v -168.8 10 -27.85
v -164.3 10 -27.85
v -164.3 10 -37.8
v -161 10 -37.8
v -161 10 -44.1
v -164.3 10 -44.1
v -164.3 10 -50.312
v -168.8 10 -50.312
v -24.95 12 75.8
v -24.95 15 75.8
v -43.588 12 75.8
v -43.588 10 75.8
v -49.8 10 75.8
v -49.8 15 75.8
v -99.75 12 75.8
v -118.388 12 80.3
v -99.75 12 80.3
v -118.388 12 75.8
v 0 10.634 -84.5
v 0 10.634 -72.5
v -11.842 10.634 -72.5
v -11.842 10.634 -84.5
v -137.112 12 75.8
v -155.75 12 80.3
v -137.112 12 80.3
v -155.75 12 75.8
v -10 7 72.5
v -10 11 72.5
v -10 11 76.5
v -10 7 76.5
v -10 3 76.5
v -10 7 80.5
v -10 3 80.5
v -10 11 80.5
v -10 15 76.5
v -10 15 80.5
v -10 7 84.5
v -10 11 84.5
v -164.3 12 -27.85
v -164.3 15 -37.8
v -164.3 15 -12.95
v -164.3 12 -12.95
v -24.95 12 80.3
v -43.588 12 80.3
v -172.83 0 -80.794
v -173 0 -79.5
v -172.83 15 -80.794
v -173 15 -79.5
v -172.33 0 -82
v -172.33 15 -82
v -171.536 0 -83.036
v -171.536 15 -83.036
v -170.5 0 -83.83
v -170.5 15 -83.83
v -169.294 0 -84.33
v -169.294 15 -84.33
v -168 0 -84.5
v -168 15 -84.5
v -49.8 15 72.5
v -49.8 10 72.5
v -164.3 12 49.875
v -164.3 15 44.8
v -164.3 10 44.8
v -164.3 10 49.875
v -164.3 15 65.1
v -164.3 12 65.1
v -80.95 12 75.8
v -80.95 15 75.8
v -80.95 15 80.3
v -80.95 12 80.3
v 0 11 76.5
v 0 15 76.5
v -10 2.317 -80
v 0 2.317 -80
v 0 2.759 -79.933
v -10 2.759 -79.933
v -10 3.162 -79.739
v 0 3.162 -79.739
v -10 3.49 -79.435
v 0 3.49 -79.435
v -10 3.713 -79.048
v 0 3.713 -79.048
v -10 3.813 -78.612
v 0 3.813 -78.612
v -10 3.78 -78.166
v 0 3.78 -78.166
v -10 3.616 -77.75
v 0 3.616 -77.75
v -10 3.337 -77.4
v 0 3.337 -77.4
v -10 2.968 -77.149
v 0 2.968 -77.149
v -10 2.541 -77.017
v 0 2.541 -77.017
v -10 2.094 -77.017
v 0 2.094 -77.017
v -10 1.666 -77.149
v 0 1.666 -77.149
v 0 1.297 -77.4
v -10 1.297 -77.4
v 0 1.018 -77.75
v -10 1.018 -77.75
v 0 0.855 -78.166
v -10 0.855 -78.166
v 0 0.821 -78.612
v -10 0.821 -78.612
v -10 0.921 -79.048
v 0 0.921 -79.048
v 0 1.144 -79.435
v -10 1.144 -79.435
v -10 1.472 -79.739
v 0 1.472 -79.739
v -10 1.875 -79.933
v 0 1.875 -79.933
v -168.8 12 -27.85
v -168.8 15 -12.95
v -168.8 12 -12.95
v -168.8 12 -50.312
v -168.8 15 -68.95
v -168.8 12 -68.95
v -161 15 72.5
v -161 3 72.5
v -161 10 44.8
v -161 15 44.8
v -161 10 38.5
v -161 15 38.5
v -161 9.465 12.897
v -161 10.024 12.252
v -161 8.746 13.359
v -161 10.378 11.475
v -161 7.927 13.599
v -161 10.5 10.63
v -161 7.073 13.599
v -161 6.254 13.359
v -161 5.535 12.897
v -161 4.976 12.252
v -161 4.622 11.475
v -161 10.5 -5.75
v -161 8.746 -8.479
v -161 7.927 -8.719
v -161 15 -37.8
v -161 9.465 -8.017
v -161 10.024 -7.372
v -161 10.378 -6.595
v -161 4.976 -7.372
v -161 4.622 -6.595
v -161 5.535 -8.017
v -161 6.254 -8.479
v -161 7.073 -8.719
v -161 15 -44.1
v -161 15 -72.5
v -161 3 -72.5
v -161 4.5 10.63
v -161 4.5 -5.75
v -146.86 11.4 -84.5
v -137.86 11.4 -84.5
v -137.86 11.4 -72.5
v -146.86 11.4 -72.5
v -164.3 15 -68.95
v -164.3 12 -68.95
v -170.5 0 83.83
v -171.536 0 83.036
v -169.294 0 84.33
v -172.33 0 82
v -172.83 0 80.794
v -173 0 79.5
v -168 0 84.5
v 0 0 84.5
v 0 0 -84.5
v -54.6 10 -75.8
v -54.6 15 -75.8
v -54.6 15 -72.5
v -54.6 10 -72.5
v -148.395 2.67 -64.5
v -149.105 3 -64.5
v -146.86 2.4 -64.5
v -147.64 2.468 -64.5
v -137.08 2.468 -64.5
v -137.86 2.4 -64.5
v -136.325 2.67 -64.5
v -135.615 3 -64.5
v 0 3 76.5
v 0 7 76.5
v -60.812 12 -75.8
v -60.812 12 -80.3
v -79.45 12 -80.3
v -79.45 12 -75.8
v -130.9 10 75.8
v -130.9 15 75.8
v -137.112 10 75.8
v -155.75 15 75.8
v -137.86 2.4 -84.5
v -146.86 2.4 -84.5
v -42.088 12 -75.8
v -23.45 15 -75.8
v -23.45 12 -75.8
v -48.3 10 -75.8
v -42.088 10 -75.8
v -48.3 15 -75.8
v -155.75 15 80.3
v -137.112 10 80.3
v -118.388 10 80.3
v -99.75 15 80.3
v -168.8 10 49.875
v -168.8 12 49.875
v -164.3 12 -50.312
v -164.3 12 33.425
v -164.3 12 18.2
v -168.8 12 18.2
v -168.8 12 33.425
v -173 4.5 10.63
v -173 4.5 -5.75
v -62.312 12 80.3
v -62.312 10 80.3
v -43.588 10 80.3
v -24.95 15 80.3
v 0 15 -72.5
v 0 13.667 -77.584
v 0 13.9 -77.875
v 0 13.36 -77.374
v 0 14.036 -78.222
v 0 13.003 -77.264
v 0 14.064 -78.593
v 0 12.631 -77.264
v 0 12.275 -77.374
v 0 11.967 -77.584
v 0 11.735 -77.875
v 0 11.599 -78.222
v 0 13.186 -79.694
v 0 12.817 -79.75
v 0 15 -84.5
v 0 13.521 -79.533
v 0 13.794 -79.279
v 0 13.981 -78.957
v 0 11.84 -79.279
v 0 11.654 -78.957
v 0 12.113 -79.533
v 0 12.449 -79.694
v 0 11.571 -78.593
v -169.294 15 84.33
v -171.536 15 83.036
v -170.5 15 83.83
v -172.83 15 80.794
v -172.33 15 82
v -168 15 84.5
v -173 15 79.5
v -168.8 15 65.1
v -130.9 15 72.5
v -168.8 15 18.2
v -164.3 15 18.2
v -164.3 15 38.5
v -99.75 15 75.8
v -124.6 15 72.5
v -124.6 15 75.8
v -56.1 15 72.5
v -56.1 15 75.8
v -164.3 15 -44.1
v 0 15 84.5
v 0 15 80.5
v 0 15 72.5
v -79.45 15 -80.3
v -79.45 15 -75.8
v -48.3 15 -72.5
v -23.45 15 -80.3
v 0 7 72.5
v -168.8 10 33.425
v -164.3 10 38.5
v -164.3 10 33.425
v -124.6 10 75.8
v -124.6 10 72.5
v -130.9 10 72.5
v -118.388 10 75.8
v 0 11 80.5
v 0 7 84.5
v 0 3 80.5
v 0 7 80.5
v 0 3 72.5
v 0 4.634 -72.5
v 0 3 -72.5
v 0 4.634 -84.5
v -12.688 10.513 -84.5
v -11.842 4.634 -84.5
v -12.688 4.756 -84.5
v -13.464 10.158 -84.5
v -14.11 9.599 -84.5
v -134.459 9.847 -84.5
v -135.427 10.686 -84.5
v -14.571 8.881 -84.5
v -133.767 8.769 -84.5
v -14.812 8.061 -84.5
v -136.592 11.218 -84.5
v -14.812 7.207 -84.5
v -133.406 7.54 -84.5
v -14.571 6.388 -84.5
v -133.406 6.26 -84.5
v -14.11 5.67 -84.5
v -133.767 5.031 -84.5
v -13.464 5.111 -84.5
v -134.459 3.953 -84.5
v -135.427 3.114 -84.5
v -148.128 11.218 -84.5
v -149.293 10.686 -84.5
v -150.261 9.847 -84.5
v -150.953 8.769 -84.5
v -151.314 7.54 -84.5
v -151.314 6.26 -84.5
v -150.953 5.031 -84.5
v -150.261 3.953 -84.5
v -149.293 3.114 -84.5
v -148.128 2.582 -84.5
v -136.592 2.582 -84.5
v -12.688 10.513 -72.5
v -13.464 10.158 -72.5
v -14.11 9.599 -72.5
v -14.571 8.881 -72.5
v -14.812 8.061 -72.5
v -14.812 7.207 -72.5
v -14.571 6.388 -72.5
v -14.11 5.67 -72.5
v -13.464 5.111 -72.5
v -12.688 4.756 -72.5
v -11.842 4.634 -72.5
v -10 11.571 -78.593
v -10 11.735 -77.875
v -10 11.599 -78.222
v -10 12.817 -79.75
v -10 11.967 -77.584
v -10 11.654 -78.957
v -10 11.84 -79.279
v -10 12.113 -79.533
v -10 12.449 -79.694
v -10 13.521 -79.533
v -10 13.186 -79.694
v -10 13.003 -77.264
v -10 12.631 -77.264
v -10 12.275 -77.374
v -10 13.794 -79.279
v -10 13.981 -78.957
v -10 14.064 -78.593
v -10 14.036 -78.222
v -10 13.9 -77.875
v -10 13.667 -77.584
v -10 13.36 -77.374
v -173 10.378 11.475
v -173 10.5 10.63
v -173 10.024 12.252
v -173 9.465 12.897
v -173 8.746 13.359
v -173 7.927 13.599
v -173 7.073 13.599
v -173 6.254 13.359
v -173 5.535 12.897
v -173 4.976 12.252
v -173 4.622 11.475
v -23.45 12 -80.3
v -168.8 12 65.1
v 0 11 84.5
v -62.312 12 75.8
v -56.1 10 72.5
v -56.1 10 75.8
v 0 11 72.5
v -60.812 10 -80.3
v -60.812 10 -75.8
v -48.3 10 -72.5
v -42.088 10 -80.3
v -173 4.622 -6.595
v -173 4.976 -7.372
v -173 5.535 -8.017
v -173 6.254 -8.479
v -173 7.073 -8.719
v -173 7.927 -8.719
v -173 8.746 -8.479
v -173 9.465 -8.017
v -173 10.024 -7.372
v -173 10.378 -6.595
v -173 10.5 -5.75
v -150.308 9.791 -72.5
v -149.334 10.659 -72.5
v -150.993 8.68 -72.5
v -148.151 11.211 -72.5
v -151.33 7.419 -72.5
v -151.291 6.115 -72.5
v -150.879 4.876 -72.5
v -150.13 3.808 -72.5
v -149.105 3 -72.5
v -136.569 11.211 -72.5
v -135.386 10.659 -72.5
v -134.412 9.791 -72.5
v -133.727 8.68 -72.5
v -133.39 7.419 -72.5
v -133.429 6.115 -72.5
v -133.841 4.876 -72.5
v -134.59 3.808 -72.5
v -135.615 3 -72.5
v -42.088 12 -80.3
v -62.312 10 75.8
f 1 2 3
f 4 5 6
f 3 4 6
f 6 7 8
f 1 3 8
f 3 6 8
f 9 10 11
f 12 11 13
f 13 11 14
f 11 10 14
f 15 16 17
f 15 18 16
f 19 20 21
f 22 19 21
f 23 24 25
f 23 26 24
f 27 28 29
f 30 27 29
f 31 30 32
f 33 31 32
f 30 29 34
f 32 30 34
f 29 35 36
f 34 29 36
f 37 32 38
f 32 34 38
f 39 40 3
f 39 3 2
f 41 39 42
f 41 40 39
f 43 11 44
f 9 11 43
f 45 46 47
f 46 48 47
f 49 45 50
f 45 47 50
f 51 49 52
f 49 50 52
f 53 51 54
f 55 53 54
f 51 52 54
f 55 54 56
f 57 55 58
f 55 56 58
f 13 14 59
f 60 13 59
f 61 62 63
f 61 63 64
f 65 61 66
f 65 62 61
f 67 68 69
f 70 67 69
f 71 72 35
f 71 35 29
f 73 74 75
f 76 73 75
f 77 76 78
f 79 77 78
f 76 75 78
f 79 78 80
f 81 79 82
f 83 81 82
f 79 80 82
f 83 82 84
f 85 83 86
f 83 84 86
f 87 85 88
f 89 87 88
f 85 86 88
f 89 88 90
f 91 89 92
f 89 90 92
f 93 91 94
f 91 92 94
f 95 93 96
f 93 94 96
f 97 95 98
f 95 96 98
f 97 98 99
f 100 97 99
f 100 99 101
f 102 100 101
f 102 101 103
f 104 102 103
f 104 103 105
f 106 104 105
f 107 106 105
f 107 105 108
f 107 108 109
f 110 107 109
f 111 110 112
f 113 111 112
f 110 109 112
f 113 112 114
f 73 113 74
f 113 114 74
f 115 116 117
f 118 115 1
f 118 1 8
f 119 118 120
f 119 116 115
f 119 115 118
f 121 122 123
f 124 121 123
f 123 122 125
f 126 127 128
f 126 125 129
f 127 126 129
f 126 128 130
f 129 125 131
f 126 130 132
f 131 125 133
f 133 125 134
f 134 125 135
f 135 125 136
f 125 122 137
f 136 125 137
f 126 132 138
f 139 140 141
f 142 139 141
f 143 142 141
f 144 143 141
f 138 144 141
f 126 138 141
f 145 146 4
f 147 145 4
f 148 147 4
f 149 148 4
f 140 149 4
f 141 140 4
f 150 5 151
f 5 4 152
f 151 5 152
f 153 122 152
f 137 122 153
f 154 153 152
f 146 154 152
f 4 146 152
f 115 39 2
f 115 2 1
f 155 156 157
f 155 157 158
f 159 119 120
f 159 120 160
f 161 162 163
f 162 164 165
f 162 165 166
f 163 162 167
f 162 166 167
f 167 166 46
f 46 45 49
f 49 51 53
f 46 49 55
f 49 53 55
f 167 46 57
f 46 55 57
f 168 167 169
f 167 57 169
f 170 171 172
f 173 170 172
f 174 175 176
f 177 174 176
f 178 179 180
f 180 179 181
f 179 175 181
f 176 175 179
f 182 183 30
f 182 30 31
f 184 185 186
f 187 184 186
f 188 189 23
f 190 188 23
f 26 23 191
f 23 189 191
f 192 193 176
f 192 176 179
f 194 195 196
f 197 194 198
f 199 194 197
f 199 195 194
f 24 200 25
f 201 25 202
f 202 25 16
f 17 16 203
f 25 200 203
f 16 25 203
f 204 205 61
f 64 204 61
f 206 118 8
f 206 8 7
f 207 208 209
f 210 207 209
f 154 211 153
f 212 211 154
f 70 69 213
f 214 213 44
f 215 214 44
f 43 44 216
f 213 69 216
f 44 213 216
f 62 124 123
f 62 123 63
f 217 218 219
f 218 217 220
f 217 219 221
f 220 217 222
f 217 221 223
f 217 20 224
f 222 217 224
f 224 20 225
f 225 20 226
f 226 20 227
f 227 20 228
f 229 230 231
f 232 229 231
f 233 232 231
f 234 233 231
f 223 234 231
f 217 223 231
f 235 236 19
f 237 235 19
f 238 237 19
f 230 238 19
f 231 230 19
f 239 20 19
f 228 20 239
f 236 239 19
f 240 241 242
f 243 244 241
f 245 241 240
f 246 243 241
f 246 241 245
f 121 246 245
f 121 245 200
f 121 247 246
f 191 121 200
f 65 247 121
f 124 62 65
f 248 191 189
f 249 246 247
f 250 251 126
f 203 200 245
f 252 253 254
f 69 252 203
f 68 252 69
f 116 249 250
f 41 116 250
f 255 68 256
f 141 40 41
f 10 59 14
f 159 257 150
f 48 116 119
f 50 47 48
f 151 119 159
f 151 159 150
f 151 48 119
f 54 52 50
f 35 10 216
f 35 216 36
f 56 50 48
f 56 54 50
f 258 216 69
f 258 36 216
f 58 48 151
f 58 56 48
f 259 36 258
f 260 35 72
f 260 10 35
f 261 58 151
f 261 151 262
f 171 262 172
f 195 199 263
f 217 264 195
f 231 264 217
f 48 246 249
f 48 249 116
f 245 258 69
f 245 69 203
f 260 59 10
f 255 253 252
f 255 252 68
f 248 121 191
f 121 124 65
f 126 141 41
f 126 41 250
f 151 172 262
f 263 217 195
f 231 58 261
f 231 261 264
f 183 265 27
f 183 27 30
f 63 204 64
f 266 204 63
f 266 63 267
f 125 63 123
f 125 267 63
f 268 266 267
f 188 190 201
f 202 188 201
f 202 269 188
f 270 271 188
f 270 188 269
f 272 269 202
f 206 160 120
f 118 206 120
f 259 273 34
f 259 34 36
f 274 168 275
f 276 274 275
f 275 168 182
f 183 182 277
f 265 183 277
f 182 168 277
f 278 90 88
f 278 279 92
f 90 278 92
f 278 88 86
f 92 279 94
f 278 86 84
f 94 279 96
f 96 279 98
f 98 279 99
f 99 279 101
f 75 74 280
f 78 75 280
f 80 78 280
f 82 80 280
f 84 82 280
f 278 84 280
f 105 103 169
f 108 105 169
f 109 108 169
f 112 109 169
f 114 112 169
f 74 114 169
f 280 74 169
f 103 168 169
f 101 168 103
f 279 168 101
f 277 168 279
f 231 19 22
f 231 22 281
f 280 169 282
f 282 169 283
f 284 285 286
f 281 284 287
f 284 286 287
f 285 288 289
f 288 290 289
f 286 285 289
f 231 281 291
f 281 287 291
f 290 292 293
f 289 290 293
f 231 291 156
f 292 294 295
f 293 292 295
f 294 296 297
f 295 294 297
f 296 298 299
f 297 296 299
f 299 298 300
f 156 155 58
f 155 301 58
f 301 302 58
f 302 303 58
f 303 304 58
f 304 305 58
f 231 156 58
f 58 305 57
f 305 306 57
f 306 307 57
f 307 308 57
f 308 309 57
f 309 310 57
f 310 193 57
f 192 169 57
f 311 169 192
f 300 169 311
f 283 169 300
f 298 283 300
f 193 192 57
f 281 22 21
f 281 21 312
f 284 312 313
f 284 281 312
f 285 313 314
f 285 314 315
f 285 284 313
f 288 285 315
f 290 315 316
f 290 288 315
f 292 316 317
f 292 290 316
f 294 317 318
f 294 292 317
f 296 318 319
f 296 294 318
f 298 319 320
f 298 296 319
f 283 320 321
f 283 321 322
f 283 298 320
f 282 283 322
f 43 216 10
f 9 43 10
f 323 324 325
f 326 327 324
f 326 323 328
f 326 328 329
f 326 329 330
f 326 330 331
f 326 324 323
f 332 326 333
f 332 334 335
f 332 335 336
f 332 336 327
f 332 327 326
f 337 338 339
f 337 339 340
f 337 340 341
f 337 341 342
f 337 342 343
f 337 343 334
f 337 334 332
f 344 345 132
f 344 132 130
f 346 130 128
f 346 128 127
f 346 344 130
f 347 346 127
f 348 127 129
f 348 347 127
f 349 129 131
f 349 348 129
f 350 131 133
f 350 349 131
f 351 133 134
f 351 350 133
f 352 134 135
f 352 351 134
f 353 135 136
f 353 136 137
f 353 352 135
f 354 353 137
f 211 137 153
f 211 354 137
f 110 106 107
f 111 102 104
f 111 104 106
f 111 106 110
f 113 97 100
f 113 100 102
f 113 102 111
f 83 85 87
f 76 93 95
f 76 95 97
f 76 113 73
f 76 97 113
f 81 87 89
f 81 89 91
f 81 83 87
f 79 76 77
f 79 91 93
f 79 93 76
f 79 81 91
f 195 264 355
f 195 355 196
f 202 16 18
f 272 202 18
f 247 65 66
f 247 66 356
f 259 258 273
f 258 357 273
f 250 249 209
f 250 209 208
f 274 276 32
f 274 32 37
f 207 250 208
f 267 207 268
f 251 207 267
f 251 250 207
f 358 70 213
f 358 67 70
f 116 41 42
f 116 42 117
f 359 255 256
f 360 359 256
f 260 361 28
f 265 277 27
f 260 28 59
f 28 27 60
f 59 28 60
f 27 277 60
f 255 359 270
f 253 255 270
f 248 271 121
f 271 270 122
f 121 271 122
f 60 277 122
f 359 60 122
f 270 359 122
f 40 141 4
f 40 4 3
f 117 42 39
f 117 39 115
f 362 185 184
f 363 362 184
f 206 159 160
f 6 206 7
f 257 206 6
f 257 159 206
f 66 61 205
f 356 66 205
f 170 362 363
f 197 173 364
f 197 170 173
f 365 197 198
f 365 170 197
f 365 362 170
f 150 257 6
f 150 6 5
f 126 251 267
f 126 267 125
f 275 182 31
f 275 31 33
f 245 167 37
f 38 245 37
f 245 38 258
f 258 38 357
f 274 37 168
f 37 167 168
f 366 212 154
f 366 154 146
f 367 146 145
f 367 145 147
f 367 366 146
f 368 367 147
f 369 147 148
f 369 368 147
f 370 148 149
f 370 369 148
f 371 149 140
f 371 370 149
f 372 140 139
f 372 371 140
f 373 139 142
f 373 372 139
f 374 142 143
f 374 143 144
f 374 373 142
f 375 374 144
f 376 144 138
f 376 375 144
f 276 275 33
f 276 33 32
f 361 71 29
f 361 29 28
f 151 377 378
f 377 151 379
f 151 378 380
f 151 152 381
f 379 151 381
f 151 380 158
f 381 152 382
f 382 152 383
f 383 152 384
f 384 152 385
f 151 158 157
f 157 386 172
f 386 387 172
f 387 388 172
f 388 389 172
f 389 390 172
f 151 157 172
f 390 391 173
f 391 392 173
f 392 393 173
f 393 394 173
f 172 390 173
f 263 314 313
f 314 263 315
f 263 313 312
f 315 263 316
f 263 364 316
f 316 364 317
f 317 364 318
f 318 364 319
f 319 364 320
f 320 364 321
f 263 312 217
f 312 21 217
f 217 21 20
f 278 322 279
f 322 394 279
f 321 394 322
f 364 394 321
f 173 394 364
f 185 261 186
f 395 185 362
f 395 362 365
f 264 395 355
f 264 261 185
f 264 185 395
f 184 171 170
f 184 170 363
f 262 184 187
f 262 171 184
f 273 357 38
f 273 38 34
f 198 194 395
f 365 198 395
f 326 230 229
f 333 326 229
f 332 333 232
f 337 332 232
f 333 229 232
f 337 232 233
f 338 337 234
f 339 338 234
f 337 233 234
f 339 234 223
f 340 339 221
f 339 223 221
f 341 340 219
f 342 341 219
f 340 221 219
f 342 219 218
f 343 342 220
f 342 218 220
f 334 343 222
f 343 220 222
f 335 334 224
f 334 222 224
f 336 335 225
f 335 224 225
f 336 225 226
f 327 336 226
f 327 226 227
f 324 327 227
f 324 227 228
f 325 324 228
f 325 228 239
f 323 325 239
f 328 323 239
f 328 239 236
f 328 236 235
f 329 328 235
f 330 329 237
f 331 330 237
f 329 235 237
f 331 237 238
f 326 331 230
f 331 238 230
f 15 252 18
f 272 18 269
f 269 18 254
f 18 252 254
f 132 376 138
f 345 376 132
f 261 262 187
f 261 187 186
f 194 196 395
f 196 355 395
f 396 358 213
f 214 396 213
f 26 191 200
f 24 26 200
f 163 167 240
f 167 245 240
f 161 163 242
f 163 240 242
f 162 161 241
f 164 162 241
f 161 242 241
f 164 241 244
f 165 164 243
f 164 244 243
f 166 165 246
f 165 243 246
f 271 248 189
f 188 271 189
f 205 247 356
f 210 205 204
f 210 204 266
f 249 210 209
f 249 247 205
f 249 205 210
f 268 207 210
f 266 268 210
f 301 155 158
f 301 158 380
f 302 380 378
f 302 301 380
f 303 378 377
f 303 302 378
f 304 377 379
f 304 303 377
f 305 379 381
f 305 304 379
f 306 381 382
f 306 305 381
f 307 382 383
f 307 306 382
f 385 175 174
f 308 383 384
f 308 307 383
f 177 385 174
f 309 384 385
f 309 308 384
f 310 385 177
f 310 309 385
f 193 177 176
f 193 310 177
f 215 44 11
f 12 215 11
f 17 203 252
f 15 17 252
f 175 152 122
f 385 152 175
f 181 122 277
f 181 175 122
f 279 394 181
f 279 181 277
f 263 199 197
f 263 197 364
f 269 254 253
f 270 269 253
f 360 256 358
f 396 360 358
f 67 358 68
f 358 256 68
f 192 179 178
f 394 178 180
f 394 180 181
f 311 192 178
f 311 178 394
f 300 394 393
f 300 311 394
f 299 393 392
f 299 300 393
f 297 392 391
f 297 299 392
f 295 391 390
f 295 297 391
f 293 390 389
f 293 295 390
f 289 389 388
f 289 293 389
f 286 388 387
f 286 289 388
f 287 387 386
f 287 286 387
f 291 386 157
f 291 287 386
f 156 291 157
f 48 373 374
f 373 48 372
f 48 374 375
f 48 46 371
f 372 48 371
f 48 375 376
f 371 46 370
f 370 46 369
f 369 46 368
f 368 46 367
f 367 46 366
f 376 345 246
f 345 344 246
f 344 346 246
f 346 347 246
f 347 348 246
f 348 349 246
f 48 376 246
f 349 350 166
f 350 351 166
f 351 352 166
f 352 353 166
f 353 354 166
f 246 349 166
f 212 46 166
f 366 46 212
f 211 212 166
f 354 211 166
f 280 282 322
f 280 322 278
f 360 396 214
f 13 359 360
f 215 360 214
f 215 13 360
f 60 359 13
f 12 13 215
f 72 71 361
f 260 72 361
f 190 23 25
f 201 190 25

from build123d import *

# Parameters (mm, degrees)
SKETCH1_W           = 161
SKETCH1_H           = 145
BOSS_EXTRUDE1_DEPTH = 3
BOSS_EXTRUDE2_DEPTH = 15
CUT_EXTRUDE1_DEPTH  = 3
CUT_EXTRUDE2_DEPTH  = 2
CUT_EXTRUDE3_DEPTH  = 12
CUT_EXTRUDE5_DEPTH  = 12
CUT_EXTRUDE6_DEPTH  = 20
CUT_EXTRUDE8_DEPTH  = 10
FILLET2_R           = 5
FILLET3_R           = 5
SKETCH11_R          = 1.5
SKETCH11_R_2        = 1.25
CUT_EXTRUDE9_DEPTH  = 10


with BuildPart() as part:
    # Sketch1 → Boss-Extrude1 (new body)
    with BuildSketch(Plane(origin=(0, 0, 0), x_dir=(1, 0, 0), z_dir=(0, 1, 0))):
        with Locations((-80.5, 0)):
            Rectangle(SKETCH1_W, SKETCH1_H)
    extrude(amount=BOSS_EXTRUDE1_DEPTH)

    # Sketch2 → Boss-Extrude2 (add)
    with BuildSketch(Plane(origin=(0, 0, 0), x_dir=(1, 0, 0), z_dir=(0, 1, 0))):
        Polygon((0, 72.5), (0, 84.5), (-173, 84.5), (-173, -84.5), (0, -84.5), (0, -72.5), (-161, -72.5), (-161, 72.5), align=None)
    extrude(amount=BOSS_EXTRUDE2_DEPTH)

    # Sketch3 → Cut-Extrude1 (cut)
    with BuildSketch(Plane(origin=(0, 15, 0), x_dir=(1, 0, 0), z_dir=(0, 1, 0))):
        Polygon((-161, 44.1), (-161, 37.8), (-164.3, 37.8), (-164.3, 12.95), (-168.8, 12.95), (-168.8, 68.95), (-164.3, 68.95), (-164.3, 44.1), align=None)
        Polygon((-24.95, -75.8), (-49.8, -75.8), (-49.8, -72.5), (-56.1, -72.5), (-56.1, -75.8), (-80.95, -75.8), (-80.95, -80.3), (-24.95, -80.3), align=None)
        Polygon((-161, -38.5), (-161, -44.8), (-164.3, -44.8), (-164.3, -65.1), (-168.8, -65.1), (-168.8, -18.2), (-164.3, -18.2), (-164.3, -38.5), align=None)
        Polygon((-99.75, -80.3), (-99.75, -75.8), (-124.6, -75.8), (-124.6, -72.5), (-130.9, -72.5), (-130.9, -75.8), (-155.75, -75.8), (-155.75, -80.3), align=None)
        Polygon((-48.3, 75.8), (-48.3, 72.5), (-54.6, 72.5), (-54.6, 75.8), (-79.45, 75.8), (-79.45, 80.3), (-23.45, 80.3), (-23.45, 75.8), align=None)
    extrude(amount=-CUT_EXTRUDE1_DEPTH, mode=Mode.SUBTRACT)

    # Sketch4 → Cut-Extrude2 (cut)
    with BuildSketch(Plane(origin=(0, 12, 0), x_dir=(1, 0, 0), z_dir=(0, 1, 0))):
        Polygon((-54.6, 72.5), (-48.3, 72.5), (-48.3, 75.8), (-42.0875, 75.8), (-42.0875, 80.3), (-60.8125, 80.3), (-60.8125, 75.8), (-54.6, 75.8), align=None)
        Polygon((-161, 44.1), (-161, 37.8), (-164.3, 37.8), (-164.3, 27.850226284), (-168.8, 27.850226284), (-168.8, 50.3125), (-164.3, 50.3125), (-164.3, 44.1), align=None)
        Polygon((-168.8, -33.425), (-168.8, -49.875), (-164.3, -49.875), (-164.3, -44.8), (-161, -44.8), (-161, -38.5), (-164.3, -38.5), (-164.3, -33.425), align=None)
        Polygon((-130.9, -72.5), (-130.9, -75.8), (-137.1125, -75.8), (-137.1125, -80.3), (-118.3875, -80.3), (-118.3875, -75.8), (-124.6, -75.8), (-124.6, -72.5), align=None)
        Polygon((-56.1, -75.8), (-62.3125, -75.8), (-62.3125, -80.3), (-43.5875, -80.3), (-43.5875, -75.8), (-49.8, -75.8), (-49.8, -72.5), (-56.1, -72.5), align=None)
    extrude(amount=-CUT_EXTRUDE2_DEPTH, mode=Mode.SUBTRACT)

    # Sketch5 → Cut-Extrude3 (cut)
    with BuildSketch(Plane.ZY.offset(173)):
        with BuildLine():
            Line((-5.75, 10.5), (10.63, 10.5))
            ThreePointArc((10.63, 10.5), (13.63, 7.5), (10.63, 4.5))
            Line((10.63, 4.5), (-5.75, 4.5))
            ThreePointArc((-5.75, 4.5), (-8.75, 7.5), (-5.75, 10.5))
        make_face()
    extrude(amount=-CUT_EXTRUDE3_DEPTH, mode=Mode.SUBTRACT)

    # Sketch7 → Cut-Extrude5 (cut)
    with BuildSketch(Plane(origin=(0, 0, -84.5), x_dir=(-1, 0, 0), z_dir=(0, 0, -1))):
        with BuildLine():
            Line((-4.5375, 10.634328206), (11.8425, 10.634328206))
            ThreePointArc((11.8425, 10.634328206), (14.8425, 7.634328206), (11.8425, 4.634328206))
            Line((11.8425, 4.634328206), (-4.5375, 4.634328206))
            ThreePointArc((-4.5375, 4.634328206), (-7.5375, 7.634328206), (-4.5375, 10.634328206))
        make_face()
    extrude(amount=-CUT_EXTRUDE5_DEPTH, mode=Mode.SUBTRACT)

    # Sketch8 → Cut-Extrude6 (cut)
    with BuildSketch(Plane(origin=(0, 0, -84.5), x_dir=(-1, 0, 0), z_dir=(0, 0, -1))):
        with BuildLine():
            Line((137.86, 11.4), (146.86, 11.4))
            ThreePointArc((146.86, 11.4), (151.36, 6.9), (146.86, 2.4))
            Line((146.86, 2.4), (137.86, 2.4))
            ThreePointArc((137.86, 2.4), (133.36, 6.9), (137.86, 11.4))
        make_face()
    extrude(amount=-CUT_EXTRUDE6_DEPTH, mode=Mode.SUBTRACT)

    # Sketch10 → Cut-Extrude8 (cut)
    with BuildSketch(Plane(origin=(0, 0, 0), x_dir=(0, 0, -1), z_dir=(1, 0, 0))):
        Polygon((-80.5, 15), (-76.5, 15), (-76.5, 11), (-72.5, 11), (-72.5, 7), (-76.5, 7), (-76.5, 3), (-80.5, 3), (-80.5, 7), (-84.5, 7), (-84.5, 11), (-80.5, 11), align=None)
    extrude(amount=-CUT_EXTRUDE8_DEPTH, mode=Mode.SUBTRACT)

    # Fillet2
    fillet2_edges = [part.edges().sort_by_distance(p)[0] for p in [
        (-173, 7.5, 84.5),
    ]]
    fillet(fillet2_edges, radius=FILLET2_R)

    # Fillet3
    fillet3_edges = [part.edges().sort_by_distance(p)[0] for p in [
        (-173, 7.5, -84.5),
    ]]
    fillet(fillet3_edges, radius=FILLET3_R)

    # Sketch11 → Cut-Extrude9 (cut)
    with BuildSketch(Plane(origin=(0, 0, 0), x_dir=(0, 0, -1), z_dir=(1, 0, 0))):
        with Locations((78.5, 2.317164103)):
            Circle(SKETCH11_R)
        with Locations((78.5, 12.817164103)):
            Circle(SKETCH11_R_2)
    extrude(amount=-CUT_EXTRUDE9_DEPTH, mode=Mode.SUBTRACT)


solid = part.part
